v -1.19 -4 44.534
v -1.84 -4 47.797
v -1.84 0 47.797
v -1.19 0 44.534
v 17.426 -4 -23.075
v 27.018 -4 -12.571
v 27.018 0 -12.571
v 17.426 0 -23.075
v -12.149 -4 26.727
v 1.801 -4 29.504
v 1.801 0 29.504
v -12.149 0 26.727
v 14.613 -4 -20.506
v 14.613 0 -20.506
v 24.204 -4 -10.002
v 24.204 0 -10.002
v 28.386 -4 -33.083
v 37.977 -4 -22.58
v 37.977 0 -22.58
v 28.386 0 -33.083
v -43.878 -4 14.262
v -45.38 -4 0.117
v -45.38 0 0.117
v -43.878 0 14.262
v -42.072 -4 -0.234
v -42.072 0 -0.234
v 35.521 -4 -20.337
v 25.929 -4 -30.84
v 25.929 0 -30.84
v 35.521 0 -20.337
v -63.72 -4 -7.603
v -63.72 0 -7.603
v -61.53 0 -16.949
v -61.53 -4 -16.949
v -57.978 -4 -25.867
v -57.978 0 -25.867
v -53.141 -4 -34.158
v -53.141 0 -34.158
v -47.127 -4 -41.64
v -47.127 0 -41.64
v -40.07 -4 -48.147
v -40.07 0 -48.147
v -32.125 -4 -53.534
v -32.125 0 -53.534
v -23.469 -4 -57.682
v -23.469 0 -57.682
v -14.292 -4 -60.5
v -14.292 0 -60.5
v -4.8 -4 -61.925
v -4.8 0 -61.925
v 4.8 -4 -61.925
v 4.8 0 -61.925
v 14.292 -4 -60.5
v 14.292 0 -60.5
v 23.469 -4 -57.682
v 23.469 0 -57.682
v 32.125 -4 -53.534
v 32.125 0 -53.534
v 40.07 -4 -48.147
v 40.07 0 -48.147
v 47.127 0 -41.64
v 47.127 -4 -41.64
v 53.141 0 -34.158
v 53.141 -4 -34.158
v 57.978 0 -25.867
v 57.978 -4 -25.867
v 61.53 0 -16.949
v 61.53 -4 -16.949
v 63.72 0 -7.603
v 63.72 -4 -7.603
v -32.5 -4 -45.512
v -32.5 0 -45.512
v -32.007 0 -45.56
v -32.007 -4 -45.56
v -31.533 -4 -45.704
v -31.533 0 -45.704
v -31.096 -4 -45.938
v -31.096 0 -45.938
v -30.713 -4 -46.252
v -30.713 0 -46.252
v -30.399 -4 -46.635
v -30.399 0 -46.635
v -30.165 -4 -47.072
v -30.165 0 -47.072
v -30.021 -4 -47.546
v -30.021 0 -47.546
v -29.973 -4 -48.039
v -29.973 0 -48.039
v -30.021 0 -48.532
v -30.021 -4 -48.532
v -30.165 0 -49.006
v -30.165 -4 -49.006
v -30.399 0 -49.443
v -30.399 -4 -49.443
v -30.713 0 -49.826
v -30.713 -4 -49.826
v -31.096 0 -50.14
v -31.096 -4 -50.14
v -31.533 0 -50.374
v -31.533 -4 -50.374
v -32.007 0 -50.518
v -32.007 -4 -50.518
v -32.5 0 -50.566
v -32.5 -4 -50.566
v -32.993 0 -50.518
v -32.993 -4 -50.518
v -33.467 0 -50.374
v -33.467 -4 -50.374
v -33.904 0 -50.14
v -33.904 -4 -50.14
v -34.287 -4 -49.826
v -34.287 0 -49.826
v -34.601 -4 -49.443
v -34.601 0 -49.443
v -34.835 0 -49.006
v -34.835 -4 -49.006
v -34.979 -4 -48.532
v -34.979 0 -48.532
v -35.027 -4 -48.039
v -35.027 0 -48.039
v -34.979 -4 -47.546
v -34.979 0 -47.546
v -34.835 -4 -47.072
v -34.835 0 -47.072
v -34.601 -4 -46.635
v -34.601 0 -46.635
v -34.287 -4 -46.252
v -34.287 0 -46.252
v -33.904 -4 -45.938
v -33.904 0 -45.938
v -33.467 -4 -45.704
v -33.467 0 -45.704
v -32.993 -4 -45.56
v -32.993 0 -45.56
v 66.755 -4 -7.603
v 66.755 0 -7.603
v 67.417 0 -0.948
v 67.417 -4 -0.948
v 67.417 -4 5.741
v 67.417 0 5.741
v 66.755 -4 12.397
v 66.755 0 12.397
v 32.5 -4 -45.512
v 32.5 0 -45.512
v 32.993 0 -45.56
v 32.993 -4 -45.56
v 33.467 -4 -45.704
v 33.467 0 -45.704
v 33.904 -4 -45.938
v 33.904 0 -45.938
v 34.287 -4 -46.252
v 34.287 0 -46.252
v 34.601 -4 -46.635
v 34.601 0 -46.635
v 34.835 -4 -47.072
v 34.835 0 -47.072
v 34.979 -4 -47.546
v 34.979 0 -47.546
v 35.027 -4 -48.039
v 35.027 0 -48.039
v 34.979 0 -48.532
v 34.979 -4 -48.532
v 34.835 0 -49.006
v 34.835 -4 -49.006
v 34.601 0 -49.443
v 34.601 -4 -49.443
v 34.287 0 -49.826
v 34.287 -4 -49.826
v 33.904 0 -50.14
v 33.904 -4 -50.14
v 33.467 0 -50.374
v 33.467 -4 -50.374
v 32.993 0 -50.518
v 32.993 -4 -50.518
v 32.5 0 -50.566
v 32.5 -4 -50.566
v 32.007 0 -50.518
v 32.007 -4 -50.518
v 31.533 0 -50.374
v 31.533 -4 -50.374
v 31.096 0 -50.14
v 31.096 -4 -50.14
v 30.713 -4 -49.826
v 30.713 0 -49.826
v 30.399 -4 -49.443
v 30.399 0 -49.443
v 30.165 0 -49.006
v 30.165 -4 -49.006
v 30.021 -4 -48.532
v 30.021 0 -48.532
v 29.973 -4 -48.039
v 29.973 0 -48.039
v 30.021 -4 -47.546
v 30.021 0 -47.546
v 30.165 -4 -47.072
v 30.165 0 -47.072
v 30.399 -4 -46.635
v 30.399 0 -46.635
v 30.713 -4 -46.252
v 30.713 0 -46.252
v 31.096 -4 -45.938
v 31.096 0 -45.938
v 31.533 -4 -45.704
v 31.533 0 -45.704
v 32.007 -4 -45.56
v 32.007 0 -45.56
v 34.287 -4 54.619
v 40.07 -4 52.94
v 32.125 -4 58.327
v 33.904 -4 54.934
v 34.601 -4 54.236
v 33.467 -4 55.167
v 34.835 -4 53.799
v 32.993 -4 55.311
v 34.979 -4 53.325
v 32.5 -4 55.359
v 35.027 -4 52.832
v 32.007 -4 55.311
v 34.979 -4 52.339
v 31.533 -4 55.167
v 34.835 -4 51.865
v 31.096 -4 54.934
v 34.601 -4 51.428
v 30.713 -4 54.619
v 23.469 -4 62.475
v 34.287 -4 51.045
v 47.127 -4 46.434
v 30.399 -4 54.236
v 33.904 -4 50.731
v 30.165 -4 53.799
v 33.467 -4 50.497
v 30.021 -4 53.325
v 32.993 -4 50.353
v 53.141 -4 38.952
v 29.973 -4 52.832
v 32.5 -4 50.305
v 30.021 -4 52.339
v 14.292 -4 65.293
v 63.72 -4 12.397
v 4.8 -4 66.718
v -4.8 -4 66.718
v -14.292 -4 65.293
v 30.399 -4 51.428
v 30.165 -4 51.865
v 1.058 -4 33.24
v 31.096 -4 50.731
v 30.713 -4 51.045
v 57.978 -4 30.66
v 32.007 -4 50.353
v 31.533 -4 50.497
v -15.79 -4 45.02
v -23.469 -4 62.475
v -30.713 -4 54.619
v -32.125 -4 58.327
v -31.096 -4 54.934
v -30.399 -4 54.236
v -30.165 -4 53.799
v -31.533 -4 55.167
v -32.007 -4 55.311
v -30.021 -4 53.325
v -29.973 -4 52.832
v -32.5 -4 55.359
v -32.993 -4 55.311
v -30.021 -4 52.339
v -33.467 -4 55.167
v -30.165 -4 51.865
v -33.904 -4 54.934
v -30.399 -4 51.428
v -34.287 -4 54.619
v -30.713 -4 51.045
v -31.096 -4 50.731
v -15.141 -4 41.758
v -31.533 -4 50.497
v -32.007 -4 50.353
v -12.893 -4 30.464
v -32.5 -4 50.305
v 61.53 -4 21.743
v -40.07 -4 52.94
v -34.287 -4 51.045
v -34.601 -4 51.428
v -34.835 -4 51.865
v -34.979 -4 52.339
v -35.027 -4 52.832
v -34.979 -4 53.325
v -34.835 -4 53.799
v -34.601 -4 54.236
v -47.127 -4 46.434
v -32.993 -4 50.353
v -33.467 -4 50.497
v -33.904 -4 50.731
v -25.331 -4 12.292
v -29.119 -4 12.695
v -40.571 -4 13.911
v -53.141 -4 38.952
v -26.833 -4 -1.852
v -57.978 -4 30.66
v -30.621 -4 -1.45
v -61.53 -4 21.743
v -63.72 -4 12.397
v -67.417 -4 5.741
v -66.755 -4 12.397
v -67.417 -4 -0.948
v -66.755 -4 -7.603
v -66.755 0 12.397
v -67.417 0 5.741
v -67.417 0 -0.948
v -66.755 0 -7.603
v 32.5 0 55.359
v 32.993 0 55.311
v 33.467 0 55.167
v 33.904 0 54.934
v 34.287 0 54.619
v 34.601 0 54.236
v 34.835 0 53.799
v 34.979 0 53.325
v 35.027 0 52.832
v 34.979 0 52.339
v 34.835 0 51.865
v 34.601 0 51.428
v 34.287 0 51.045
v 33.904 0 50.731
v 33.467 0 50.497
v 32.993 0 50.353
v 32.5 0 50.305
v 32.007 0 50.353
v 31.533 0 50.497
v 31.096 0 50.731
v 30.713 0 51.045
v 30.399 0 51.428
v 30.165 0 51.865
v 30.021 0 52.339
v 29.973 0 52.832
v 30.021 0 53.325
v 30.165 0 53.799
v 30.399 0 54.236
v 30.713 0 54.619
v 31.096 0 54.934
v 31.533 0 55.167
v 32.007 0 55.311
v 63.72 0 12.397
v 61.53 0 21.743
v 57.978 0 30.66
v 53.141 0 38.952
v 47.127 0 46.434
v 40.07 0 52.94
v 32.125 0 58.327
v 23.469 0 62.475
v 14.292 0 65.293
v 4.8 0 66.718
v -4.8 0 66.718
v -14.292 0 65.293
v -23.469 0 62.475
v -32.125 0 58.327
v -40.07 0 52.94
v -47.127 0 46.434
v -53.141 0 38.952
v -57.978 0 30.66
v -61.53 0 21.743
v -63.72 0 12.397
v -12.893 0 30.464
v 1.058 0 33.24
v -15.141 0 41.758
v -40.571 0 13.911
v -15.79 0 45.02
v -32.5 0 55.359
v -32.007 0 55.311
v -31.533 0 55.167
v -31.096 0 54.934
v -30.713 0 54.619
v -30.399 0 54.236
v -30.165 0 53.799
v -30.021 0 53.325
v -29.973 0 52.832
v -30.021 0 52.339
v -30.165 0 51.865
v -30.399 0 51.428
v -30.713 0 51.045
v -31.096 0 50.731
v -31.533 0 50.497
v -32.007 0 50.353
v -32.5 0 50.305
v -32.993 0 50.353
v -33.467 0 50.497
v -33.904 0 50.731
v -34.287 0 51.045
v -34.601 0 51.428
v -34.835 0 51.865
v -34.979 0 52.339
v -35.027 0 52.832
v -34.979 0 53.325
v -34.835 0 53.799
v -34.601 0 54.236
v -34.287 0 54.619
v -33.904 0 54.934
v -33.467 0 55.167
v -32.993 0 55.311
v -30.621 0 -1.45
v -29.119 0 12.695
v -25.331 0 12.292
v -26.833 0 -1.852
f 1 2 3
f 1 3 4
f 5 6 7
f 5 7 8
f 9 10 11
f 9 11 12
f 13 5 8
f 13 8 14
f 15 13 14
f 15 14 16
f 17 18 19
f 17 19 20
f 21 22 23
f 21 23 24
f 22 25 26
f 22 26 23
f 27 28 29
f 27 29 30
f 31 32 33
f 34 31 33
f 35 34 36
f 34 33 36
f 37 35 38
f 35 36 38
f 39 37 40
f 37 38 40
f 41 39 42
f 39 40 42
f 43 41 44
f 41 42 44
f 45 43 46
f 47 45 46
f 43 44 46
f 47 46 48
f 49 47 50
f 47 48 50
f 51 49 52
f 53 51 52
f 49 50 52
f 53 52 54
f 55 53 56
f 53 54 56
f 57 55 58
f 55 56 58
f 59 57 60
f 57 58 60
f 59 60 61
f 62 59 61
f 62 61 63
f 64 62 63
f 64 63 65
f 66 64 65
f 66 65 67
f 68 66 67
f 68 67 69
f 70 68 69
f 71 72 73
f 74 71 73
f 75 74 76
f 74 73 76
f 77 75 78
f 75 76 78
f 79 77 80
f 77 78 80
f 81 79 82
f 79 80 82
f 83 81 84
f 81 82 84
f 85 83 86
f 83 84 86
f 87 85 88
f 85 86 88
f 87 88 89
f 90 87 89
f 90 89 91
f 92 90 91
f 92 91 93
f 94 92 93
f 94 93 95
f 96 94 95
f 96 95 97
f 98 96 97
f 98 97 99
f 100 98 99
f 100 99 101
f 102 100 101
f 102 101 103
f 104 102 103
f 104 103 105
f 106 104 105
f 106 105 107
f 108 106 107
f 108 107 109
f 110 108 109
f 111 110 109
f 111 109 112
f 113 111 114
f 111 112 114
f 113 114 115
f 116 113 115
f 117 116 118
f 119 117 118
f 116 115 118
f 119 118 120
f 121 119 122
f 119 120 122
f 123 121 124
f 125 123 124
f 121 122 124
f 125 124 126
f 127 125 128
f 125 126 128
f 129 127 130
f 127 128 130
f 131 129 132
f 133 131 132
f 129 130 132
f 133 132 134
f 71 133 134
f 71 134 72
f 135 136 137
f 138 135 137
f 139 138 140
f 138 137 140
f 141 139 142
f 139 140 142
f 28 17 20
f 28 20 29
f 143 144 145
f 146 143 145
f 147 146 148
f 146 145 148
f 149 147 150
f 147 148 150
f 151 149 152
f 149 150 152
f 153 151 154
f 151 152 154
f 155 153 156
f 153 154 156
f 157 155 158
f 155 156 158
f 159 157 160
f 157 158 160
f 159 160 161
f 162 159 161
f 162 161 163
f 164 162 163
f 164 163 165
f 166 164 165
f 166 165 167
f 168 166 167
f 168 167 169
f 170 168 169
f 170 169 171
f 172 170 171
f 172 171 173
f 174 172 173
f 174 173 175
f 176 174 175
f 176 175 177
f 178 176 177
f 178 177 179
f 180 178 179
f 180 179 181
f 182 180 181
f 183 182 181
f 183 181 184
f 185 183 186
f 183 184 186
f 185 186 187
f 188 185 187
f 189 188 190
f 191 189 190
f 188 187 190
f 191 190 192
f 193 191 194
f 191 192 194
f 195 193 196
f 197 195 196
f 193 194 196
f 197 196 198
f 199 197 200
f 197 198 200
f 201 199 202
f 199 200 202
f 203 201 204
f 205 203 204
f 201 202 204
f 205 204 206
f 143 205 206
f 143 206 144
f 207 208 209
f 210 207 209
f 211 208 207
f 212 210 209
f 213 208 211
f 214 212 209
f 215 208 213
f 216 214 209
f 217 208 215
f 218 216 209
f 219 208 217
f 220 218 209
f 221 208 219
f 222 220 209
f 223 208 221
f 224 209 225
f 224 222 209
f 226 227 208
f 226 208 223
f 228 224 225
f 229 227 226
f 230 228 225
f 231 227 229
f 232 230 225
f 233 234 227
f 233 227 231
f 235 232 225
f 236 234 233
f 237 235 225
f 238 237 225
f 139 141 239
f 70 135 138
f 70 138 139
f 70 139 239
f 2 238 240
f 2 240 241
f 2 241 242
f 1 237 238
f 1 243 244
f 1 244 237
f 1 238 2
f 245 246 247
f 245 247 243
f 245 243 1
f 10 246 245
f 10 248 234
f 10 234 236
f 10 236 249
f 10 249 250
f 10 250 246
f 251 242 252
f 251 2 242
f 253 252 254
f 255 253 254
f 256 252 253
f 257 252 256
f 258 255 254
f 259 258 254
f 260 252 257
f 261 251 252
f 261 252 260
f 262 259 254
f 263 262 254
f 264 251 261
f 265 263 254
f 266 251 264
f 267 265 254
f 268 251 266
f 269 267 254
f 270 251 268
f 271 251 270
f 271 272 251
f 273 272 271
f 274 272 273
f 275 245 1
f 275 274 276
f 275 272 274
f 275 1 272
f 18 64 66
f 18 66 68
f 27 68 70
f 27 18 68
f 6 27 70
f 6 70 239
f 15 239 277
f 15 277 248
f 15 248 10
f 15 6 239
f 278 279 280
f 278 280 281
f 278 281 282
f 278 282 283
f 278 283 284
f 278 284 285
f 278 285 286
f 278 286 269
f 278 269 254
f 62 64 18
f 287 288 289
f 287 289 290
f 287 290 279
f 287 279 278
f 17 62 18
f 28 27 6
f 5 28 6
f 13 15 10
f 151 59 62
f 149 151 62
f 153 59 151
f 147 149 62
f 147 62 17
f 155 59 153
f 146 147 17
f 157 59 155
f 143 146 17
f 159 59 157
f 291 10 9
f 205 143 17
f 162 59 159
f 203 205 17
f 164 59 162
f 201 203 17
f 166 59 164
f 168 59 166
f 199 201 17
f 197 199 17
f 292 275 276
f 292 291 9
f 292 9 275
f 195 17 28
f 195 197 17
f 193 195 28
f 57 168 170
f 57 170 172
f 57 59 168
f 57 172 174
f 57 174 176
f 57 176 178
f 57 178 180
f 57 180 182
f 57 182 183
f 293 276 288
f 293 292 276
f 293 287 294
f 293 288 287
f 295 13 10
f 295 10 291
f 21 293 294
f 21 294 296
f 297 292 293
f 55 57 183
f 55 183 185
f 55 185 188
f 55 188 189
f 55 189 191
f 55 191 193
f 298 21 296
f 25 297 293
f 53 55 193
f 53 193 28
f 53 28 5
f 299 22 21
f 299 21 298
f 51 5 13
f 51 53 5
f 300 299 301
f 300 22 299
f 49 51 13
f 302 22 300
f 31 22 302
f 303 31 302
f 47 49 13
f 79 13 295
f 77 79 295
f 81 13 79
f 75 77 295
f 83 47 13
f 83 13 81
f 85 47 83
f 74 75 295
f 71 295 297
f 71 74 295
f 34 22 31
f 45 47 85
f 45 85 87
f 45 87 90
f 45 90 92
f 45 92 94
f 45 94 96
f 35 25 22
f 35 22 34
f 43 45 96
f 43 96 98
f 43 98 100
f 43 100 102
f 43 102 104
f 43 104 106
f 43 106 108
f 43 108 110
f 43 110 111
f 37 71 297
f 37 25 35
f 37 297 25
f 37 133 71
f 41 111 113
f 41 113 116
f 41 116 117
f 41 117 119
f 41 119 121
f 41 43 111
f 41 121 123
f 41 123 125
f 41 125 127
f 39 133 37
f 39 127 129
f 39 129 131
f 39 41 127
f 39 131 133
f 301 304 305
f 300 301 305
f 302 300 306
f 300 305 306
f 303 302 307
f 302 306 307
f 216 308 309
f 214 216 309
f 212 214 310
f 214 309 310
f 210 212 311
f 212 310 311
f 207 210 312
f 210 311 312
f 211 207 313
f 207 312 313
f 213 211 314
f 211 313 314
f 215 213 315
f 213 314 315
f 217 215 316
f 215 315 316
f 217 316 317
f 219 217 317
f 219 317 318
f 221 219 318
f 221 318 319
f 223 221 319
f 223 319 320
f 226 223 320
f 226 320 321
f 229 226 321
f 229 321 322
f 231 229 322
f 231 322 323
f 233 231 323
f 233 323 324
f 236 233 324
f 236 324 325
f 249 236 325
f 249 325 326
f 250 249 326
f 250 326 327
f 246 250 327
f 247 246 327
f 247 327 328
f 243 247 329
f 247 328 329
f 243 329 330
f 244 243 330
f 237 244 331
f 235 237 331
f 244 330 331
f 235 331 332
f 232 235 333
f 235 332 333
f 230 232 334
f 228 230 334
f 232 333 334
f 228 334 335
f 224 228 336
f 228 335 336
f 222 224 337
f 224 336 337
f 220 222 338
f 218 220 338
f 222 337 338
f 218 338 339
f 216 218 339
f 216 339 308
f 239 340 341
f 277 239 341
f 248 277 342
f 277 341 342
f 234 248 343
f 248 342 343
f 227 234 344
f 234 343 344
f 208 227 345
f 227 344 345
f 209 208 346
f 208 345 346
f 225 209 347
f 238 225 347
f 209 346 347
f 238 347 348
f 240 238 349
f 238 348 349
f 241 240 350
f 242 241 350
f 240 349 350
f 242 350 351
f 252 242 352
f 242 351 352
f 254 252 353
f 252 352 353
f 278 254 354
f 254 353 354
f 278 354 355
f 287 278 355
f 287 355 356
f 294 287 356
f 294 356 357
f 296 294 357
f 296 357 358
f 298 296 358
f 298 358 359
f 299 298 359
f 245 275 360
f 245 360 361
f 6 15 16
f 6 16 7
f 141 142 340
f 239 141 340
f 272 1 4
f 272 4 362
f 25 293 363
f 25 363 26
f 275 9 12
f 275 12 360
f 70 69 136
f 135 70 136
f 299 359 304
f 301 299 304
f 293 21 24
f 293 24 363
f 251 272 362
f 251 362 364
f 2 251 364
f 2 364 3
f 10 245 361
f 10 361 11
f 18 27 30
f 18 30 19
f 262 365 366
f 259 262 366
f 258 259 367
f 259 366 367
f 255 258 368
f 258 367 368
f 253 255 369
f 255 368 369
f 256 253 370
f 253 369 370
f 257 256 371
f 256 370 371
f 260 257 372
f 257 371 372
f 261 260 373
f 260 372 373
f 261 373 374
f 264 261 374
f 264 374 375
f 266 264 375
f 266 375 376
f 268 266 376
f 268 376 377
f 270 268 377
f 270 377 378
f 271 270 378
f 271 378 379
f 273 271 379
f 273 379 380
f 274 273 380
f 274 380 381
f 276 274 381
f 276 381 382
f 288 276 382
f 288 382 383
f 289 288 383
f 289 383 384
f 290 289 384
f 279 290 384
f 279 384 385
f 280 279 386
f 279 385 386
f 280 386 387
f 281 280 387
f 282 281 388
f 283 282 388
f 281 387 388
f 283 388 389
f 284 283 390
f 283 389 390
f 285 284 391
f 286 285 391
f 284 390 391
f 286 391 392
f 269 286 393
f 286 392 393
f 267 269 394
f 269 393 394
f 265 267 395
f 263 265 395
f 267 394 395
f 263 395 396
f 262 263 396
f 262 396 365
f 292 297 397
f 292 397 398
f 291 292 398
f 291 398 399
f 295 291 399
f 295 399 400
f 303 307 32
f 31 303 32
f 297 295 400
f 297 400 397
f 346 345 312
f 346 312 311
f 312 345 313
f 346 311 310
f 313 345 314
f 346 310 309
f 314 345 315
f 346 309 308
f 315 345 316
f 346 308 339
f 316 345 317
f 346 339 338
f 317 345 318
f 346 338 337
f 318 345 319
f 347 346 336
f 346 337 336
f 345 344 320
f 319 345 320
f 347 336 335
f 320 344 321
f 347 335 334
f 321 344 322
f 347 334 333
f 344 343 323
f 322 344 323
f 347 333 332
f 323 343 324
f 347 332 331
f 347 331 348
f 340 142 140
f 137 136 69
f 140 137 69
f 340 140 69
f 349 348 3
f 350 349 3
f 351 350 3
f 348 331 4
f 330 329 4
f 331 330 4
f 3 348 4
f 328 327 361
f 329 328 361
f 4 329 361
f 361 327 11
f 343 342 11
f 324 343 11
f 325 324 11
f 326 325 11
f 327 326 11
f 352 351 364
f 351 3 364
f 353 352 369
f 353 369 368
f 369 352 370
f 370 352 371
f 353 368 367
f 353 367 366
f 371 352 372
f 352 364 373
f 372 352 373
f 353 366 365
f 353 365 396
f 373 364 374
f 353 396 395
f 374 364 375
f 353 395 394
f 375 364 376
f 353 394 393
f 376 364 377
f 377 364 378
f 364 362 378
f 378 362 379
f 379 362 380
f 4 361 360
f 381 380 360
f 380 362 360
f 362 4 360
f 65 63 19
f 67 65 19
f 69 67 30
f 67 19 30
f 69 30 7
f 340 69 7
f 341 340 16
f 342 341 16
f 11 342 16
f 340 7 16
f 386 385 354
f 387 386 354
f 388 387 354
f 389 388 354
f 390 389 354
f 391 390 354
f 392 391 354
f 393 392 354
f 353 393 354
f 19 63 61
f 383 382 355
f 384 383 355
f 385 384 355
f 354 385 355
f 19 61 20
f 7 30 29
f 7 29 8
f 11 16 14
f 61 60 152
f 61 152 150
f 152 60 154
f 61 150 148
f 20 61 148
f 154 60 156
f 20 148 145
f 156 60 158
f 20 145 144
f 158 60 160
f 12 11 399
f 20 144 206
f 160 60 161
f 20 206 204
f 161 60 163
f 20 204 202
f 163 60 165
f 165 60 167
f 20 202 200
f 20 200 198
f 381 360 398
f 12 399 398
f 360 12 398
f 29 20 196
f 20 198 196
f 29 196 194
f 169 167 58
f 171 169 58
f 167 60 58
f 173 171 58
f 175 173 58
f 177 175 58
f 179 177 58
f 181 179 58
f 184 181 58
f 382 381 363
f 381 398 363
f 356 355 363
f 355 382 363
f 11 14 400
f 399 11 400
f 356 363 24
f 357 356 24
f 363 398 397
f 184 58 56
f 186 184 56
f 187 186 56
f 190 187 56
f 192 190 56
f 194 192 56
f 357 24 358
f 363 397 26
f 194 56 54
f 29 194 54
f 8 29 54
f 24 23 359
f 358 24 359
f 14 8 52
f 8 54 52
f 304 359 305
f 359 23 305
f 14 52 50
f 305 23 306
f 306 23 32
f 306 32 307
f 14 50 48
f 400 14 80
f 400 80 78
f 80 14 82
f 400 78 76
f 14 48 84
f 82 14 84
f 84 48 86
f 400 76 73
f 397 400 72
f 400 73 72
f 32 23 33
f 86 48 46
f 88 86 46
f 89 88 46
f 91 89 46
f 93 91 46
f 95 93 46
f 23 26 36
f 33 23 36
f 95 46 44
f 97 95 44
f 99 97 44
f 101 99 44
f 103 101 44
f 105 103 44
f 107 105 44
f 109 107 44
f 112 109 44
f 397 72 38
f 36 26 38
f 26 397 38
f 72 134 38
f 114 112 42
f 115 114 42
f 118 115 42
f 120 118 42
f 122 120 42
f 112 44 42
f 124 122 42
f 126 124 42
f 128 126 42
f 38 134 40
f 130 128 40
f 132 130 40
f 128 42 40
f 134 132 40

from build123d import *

# Parameters (mm, degrees)
BOSS_EXTRUDE1_DEPTH        = 4
F_8_0_199_DIAMETER_HOLE6_D = 5.0546
CUT_EXTRUDE1_DEPTH         = 4


with BuildPart() as part:
    # Sketch1 → Boss-Extrude1 (new body)
    with BuildSketch(Plane(origin=(0, 0, 0), x_dir=(1, 0, 0), z_dir=(0, 1, 0))):
        with BuildLine():
            Line((-63.720091023, -12.396555886), (-66.755149614, -12.396555886))
            ThreePointArc((-66.755149614, -12.396555886), (-67.5, -2.396555886), (-66.755149614, 7.603444114))
            Line((-66.755149614, 7.603444114), (-63.720091023, 7.603444114))
            ThreePointArc((-63.720091023, 7.603444114), (0, 62.103444114), (63.720091023, 7.603444114))
            Line((63.720091023, 7.603444114), (66.755149614, 7.603444114))
            ThreePointArc((66.755149614, 7.603444114), (67.5, -2.396555886), (66.755149614, -12.396555886))
            Line((66.755149614, -12.396555886), (63.720091023, -12.396555886))
            ThreePointArc((63.720091023, -12.396555886), (0, -66.896555886), (-63.720091023, -12.396555886))
        make_face()
    extrude(amount=-BOSS_EXTRUDE1_DEPTH)

    # #8 (0.199) Diameter Hole6 (through all)
    with Locations(Plane(origin=(-32.5, -4, 52.832158391), x_dir=(0, 0, -1), z_dir=(0, -1, 0))):
        with Locations((0, 0), (0, 65), (100.871205009, 65), (100.871205009, 0)):
            Hole(F_8_0_199_DIAMETER_HOLE6_D / 2)

    # Sketch4 → Cut-Extrude1 (cut)
    with BuildSketch(Plane.XZ.offset(4)):
        Polygon((17.425968137, -23.074858179), (14.612549904, -20.505660279), (24.204222064, -10.002232211), (27.017640296, -12.571430111), align=None)
        Polygon((28.385745934, -33.083266376), (25.92935527, -30.840104068), (35.52102743, -20.336676), (37.977418094, -22.579838308), align=None)
        Polygon((-26.832584157, -1.852037702), (-30.62128677, -1.449753587), (-29.119426074, 12.694736168), (-25.330723461, 12.292452053), align=None)
        Polygon((-42.072412194, -0.233874083), (-45.380321989, 0.117359492), (-43.878461293, 14.261849248), (-40.570551498, 13.910615673), align=None)
        Polygon((1.801240517, 29.503633423), (-12.149127519, 26.727051412), (-12.892854843, 30.463757136), (1.057513193, 33.240339147), align=None)
        Polygon((-1.190357845, 44.534307106), (-15.14072588, 41.757725095), (-15.79007294, 45.020236494), (-1.839704904, 47.796818505), align=None)
    extrude(amount=-CUT_EXTRUDE1_DEPTH, mode=Mode.SUBTRACT)


solid = part.part
